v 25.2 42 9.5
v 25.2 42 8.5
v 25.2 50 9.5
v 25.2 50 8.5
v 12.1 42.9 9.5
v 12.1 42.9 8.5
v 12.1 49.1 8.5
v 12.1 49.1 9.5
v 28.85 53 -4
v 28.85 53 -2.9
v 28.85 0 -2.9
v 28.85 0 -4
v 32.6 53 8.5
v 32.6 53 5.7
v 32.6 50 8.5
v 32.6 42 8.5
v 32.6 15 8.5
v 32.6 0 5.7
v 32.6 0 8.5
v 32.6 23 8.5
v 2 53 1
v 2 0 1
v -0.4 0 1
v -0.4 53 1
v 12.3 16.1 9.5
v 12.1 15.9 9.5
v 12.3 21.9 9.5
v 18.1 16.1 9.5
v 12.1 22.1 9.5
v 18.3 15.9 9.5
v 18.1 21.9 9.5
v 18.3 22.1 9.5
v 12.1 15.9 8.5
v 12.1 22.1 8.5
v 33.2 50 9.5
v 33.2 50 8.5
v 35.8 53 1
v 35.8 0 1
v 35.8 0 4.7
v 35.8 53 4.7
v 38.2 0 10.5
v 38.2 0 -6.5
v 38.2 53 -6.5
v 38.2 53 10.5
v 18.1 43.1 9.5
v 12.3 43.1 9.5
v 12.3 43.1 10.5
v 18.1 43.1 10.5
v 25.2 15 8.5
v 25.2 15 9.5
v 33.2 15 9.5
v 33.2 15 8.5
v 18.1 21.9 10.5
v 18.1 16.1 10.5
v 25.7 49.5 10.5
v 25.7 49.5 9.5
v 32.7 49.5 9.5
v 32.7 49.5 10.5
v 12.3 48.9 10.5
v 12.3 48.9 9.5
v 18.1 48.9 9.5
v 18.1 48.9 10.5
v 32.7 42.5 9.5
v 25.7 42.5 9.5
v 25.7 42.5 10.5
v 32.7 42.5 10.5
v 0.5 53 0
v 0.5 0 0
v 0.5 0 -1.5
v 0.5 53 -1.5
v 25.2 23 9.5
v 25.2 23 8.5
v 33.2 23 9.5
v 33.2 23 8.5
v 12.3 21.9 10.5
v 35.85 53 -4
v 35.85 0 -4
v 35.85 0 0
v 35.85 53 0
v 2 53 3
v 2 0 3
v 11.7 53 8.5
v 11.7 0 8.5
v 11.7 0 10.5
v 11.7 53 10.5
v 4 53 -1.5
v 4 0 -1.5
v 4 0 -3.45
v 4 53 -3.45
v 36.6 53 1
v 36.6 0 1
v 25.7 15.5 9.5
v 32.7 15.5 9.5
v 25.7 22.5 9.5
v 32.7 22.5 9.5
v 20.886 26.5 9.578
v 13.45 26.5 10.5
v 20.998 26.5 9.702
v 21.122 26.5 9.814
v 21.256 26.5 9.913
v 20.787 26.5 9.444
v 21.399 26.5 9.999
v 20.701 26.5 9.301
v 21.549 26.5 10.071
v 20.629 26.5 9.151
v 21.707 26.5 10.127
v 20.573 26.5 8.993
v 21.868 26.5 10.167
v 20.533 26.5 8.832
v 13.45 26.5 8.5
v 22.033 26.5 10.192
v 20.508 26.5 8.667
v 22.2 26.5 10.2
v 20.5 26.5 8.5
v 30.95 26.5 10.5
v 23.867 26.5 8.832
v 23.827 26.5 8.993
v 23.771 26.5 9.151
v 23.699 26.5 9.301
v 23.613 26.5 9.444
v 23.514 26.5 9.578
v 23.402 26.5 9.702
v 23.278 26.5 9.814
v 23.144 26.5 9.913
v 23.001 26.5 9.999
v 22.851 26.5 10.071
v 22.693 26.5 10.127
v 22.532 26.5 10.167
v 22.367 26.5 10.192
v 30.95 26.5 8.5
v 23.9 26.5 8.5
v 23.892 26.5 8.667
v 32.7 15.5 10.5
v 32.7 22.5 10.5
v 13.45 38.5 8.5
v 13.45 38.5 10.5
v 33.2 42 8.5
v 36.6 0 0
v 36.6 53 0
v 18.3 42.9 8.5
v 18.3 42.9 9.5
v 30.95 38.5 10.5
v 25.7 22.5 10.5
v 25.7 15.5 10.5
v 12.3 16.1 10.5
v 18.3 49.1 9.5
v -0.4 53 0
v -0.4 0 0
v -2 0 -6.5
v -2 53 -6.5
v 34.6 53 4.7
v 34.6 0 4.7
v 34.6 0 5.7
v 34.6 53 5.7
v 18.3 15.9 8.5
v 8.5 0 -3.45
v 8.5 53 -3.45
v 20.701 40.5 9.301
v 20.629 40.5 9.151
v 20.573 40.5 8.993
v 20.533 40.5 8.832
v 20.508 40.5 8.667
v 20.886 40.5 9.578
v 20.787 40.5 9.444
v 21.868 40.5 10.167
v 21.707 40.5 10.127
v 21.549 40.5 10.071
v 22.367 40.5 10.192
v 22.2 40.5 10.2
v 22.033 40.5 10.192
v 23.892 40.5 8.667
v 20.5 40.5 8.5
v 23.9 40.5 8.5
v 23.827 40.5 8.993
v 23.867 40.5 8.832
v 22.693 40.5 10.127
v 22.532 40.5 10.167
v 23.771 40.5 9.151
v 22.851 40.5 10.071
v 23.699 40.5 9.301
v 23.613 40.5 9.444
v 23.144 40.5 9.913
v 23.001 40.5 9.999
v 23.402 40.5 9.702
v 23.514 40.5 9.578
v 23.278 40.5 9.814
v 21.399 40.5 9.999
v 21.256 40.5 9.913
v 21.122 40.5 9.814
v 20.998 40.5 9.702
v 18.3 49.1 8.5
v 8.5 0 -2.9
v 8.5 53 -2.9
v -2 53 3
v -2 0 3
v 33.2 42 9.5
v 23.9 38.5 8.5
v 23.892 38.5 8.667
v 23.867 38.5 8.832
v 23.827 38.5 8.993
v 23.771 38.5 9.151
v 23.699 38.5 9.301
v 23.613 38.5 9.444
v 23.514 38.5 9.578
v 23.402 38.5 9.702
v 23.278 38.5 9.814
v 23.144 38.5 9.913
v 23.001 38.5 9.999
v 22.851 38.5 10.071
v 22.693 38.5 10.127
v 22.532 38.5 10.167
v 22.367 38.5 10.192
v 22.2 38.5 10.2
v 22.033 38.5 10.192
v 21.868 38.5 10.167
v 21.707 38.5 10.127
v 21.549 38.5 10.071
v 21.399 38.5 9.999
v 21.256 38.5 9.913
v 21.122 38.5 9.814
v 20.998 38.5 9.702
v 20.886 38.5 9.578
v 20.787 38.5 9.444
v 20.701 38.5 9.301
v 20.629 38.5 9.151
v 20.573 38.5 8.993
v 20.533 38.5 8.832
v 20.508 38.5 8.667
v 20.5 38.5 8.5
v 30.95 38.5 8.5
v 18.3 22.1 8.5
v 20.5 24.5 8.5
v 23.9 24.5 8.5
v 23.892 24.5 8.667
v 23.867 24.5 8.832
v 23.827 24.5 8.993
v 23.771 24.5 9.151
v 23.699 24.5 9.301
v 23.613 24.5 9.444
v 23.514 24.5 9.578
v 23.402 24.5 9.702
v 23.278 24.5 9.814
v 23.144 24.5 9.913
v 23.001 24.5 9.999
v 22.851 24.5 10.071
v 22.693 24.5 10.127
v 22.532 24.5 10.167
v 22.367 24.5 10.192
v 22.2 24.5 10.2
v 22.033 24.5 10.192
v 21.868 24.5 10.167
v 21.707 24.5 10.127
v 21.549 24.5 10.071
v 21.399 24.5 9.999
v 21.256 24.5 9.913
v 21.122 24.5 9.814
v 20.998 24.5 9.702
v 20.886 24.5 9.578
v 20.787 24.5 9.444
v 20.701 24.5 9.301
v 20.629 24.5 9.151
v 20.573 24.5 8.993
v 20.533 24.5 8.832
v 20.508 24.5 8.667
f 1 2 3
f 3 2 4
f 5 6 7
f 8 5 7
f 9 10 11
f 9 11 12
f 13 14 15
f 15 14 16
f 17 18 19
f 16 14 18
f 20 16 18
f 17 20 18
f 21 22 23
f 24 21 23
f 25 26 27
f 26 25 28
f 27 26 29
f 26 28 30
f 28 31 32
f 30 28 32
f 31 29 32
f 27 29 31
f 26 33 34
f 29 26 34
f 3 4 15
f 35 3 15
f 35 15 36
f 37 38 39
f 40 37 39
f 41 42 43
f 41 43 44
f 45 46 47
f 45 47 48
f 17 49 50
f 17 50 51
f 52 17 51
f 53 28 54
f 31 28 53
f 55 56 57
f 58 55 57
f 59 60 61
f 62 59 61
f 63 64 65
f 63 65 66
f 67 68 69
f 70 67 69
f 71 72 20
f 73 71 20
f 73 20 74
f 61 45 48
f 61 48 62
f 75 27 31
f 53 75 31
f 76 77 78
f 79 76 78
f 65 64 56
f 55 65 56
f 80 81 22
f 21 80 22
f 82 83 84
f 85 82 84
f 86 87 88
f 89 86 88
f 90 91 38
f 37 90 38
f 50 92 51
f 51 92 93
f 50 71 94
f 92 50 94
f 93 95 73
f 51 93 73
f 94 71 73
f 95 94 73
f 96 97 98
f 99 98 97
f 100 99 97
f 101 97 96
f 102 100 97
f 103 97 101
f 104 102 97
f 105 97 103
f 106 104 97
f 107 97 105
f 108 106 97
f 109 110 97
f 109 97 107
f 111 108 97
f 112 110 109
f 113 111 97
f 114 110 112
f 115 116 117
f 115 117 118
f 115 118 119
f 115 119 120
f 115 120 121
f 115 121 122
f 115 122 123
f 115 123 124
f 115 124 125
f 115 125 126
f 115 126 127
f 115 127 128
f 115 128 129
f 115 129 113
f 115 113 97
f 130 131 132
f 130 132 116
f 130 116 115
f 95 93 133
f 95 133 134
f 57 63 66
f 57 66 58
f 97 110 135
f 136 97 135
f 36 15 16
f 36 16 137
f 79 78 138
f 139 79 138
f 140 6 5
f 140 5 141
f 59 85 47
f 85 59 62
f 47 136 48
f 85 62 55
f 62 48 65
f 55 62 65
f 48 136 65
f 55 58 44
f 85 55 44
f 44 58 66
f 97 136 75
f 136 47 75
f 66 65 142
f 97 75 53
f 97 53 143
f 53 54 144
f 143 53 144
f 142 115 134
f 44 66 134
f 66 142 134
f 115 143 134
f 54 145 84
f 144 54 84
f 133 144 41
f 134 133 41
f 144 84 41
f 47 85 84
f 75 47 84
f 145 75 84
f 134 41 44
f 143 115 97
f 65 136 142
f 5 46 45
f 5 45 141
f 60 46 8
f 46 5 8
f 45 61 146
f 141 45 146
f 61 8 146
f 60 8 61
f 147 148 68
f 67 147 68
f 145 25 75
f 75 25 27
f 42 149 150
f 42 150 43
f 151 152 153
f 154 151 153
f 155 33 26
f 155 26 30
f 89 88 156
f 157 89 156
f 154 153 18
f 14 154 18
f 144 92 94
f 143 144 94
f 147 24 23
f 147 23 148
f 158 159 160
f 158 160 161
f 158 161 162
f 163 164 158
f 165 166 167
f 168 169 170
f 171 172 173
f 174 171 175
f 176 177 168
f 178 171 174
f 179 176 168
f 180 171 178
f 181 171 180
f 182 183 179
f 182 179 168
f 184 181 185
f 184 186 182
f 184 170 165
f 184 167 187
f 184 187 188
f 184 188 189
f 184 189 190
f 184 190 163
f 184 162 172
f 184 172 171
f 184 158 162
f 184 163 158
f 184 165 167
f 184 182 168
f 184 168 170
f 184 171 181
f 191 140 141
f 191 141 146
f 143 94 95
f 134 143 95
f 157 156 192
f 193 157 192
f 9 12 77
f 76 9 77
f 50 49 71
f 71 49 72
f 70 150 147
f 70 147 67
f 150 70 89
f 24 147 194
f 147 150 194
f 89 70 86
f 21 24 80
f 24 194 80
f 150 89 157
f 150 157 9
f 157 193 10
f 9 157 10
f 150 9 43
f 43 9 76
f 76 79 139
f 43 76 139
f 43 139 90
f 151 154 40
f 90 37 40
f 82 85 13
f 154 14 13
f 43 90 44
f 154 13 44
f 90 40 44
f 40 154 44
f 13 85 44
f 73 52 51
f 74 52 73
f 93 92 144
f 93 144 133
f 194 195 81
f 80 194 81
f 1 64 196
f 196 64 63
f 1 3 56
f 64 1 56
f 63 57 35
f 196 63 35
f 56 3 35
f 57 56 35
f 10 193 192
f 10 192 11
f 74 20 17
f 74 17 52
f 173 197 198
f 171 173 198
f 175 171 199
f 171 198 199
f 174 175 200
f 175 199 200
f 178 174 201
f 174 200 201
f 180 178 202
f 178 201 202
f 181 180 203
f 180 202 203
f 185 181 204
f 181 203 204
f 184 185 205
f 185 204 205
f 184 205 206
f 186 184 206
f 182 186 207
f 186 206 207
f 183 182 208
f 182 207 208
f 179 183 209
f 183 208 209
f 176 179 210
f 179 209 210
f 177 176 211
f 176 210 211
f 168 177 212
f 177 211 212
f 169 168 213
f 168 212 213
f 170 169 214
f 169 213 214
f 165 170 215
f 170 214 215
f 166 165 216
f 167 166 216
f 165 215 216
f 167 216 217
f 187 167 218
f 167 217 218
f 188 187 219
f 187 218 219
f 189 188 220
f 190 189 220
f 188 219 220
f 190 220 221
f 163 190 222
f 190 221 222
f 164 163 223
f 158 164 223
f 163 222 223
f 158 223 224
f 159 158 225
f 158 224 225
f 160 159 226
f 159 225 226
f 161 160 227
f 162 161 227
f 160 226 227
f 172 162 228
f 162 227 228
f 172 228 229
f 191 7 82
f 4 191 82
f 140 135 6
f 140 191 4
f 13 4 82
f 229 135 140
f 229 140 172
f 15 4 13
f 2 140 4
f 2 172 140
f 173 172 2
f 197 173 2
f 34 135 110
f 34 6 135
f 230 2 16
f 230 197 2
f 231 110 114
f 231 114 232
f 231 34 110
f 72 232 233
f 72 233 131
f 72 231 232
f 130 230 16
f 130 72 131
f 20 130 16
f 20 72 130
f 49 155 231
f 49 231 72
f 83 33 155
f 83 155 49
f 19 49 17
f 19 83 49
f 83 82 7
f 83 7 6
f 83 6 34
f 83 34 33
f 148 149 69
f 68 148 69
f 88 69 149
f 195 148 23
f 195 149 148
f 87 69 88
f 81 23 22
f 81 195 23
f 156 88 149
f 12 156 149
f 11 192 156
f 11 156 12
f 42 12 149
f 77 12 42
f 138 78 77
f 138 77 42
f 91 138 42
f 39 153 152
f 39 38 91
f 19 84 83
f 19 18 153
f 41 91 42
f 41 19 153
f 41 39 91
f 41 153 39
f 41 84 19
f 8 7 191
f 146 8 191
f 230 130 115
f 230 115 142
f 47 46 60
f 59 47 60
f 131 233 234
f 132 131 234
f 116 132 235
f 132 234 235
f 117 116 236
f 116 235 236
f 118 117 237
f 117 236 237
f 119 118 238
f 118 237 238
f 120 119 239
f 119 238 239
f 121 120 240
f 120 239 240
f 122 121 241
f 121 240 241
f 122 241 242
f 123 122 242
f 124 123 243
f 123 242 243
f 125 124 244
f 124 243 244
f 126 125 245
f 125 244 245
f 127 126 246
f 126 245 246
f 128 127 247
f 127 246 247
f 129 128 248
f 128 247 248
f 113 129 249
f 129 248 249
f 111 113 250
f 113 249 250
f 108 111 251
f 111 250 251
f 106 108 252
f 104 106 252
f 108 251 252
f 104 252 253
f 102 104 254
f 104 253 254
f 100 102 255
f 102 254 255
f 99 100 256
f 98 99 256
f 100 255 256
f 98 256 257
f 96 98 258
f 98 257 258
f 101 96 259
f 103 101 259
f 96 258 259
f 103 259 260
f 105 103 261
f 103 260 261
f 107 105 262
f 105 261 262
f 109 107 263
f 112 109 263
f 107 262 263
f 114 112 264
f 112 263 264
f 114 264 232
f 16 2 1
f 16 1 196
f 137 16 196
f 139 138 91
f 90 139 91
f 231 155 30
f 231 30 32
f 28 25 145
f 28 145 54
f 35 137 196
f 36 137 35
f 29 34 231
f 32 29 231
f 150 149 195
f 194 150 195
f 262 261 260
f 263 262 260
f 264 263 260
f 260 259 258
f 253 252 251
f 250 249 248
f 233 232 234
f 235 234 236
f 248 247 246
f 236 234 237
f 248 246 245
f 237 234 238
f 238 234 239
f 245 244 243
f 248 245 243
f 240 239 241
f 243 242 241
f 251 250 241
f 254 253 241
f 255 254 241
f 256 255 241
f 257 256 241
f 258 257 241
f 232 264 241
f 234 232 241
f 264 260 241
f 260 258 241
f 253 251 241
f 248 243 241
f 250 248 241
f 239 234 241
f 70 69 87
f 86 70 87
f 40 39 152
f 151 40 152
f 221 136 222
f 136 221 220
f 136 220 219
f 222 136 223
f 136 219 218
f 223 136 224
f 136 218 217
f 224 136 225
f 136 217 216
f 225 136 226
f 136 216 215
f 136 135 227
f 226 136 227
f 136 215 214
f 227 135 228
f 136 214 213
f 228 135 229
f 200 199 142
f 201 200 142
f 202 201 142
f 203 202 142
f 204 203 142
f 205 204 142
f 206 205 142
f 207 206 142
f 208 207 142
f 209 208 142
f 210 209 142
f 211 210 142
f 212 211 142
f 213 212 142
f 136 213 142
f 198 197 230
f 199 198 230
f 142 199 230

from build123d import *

# Parameters (mm, degrees)
SKETCH_W        = 40.2
SKETCH_H        = 15
PAD_DEPTH       = 53
POCKET_DEPTH    = 53
SKETCH022_W     = 26.5
SKETCH022_H     = 2
PAD015_DEPTH    = 53
SKETCH023_W     = 5.8
SKETCH023_H     = 5.8
SKETCH023_W_2   = 7
SKETCH023_H_2   = 7
POCKET007_DEPTH = 2.001
SKETCH024_W     = 6.2
SKETCH024_H     = 6.2
SKETCH024_W_2   = 8
SKETCH024_H_2   = 8
POCKET008_DEPTH = 1
SKETCH025_W     = 17.5
SKETCH025_H     = 12
POCKET009_DEPTH = 2.001
SKETCH026_R     = 1.7
POCKET010_DEPTH = 8


with BuildPart() as part:
    # Sketch → Pad (new body)
    with BuildSketch(Plane.XZ):
        with Locations((18.1, 1)):
            Rectangle(SKETCH_W, SKETCH_H)
    extrude(amount=-PAD_DEPTH)

    # Sketch001 → Pocket (cut)
    with BuildSketch(Plane.XZ):
        Polygon((-2, 11), (-2, 3), (2, 3), (2, 1), (-0.4, 1), (-0.4, 0), (0.5, 0), (0.5, -1.5), (4, -1.5), (4, -3.45), (8.5, -3.45), (8.5, -2.9), (28.85, -2.9), (28.85, -4), (35.85, -4), (35.85, 0), (36.6, 0), (36.6, 1), (35.8, 1), (35.8, 4.7), (34.6, 4.7), (34.6, 5.7), (32.6, 5.7), (32.6, 11), align=None)
    extrude(amount=-POCKET_DEPTH, mode=Mode.SUBTRACT)

    # Sketch022 → Pad015 (join)
    with BuildSketch(Plane.XZ):
        with Locations((24.95, 9.5)):
            Rectangle(SKETCH022_W, SKETCH022_H)
    extrude(amount=-PAD015_DEPTH)

    # Sketch023 → Pocket007 (cut, through all)
    with BuildSketch(Plane.XY.offset(8.5)):
        with Locations((15.2, 19)):
            Rectangle(SKETCH023_W, SKETCH023_H)
        with Locations((29.2, 19)):
            Rectangle(SKETCH023_W_2, SKETCH023_H_2)
        with Locations((15.2, 46)):
            Rectangle(SKETCH023_W, SKETCH023_H)
        with Locations((29.2, 46)):
            Rectangle(SKETCH023_W_2, SKETCH023_H_2)
    extrude(amount=POCKET007_DEPTH, mode=Mode.SUBTRACT)

    # Sketch024 → Pocket008 (cut)
    with BuildSketch(Plane.XY.offset(8.5)):
        with Locations((15.2, 19)):
            Rectangle(SKETCH024_W, SKETCH024_H)
        with Locations((29.2, 19)):
            Rectangle(SKETCH024_W_2, SKETCH024_H_2)
        with Locations((15.2, 46)):
            Rectangle(SKETCH024_W, SKETCH024_H)
        with Locations((29.2, 46)):
            Rectangle(SKETCH024_W_2, SKETCH024_H_2)
    extrude(amount=POCKET008_DEPTH, mode=Mode.SUBTRACT)

    # Sketch025 → Pocket009 (cut, through all)
    with BuildSketch(Plane.XY.offset(8.5)):
        with Locations((22.2, 32.5)):
            Rectangle(SKETCH025_W, SKETCH025_H)
    extrude(amount=POCKET009_DEPTH, mode=Mode.SUBTRACT)

    # Sketch026 → Pocket010 (cut, symmetric)
    with BuildSketch(Plane(origin=(0, 32.5, 8.5), x_dir=(1, 0, 0), z_dir=(0, -1, 0))):
        with Locations((22.2, 0)):
            Circle(SKETCH026_R)
    extrude(amount=POCKET010_DEPTH, both=True, mode=Mode.SUBTRACT)


solid = part.part
